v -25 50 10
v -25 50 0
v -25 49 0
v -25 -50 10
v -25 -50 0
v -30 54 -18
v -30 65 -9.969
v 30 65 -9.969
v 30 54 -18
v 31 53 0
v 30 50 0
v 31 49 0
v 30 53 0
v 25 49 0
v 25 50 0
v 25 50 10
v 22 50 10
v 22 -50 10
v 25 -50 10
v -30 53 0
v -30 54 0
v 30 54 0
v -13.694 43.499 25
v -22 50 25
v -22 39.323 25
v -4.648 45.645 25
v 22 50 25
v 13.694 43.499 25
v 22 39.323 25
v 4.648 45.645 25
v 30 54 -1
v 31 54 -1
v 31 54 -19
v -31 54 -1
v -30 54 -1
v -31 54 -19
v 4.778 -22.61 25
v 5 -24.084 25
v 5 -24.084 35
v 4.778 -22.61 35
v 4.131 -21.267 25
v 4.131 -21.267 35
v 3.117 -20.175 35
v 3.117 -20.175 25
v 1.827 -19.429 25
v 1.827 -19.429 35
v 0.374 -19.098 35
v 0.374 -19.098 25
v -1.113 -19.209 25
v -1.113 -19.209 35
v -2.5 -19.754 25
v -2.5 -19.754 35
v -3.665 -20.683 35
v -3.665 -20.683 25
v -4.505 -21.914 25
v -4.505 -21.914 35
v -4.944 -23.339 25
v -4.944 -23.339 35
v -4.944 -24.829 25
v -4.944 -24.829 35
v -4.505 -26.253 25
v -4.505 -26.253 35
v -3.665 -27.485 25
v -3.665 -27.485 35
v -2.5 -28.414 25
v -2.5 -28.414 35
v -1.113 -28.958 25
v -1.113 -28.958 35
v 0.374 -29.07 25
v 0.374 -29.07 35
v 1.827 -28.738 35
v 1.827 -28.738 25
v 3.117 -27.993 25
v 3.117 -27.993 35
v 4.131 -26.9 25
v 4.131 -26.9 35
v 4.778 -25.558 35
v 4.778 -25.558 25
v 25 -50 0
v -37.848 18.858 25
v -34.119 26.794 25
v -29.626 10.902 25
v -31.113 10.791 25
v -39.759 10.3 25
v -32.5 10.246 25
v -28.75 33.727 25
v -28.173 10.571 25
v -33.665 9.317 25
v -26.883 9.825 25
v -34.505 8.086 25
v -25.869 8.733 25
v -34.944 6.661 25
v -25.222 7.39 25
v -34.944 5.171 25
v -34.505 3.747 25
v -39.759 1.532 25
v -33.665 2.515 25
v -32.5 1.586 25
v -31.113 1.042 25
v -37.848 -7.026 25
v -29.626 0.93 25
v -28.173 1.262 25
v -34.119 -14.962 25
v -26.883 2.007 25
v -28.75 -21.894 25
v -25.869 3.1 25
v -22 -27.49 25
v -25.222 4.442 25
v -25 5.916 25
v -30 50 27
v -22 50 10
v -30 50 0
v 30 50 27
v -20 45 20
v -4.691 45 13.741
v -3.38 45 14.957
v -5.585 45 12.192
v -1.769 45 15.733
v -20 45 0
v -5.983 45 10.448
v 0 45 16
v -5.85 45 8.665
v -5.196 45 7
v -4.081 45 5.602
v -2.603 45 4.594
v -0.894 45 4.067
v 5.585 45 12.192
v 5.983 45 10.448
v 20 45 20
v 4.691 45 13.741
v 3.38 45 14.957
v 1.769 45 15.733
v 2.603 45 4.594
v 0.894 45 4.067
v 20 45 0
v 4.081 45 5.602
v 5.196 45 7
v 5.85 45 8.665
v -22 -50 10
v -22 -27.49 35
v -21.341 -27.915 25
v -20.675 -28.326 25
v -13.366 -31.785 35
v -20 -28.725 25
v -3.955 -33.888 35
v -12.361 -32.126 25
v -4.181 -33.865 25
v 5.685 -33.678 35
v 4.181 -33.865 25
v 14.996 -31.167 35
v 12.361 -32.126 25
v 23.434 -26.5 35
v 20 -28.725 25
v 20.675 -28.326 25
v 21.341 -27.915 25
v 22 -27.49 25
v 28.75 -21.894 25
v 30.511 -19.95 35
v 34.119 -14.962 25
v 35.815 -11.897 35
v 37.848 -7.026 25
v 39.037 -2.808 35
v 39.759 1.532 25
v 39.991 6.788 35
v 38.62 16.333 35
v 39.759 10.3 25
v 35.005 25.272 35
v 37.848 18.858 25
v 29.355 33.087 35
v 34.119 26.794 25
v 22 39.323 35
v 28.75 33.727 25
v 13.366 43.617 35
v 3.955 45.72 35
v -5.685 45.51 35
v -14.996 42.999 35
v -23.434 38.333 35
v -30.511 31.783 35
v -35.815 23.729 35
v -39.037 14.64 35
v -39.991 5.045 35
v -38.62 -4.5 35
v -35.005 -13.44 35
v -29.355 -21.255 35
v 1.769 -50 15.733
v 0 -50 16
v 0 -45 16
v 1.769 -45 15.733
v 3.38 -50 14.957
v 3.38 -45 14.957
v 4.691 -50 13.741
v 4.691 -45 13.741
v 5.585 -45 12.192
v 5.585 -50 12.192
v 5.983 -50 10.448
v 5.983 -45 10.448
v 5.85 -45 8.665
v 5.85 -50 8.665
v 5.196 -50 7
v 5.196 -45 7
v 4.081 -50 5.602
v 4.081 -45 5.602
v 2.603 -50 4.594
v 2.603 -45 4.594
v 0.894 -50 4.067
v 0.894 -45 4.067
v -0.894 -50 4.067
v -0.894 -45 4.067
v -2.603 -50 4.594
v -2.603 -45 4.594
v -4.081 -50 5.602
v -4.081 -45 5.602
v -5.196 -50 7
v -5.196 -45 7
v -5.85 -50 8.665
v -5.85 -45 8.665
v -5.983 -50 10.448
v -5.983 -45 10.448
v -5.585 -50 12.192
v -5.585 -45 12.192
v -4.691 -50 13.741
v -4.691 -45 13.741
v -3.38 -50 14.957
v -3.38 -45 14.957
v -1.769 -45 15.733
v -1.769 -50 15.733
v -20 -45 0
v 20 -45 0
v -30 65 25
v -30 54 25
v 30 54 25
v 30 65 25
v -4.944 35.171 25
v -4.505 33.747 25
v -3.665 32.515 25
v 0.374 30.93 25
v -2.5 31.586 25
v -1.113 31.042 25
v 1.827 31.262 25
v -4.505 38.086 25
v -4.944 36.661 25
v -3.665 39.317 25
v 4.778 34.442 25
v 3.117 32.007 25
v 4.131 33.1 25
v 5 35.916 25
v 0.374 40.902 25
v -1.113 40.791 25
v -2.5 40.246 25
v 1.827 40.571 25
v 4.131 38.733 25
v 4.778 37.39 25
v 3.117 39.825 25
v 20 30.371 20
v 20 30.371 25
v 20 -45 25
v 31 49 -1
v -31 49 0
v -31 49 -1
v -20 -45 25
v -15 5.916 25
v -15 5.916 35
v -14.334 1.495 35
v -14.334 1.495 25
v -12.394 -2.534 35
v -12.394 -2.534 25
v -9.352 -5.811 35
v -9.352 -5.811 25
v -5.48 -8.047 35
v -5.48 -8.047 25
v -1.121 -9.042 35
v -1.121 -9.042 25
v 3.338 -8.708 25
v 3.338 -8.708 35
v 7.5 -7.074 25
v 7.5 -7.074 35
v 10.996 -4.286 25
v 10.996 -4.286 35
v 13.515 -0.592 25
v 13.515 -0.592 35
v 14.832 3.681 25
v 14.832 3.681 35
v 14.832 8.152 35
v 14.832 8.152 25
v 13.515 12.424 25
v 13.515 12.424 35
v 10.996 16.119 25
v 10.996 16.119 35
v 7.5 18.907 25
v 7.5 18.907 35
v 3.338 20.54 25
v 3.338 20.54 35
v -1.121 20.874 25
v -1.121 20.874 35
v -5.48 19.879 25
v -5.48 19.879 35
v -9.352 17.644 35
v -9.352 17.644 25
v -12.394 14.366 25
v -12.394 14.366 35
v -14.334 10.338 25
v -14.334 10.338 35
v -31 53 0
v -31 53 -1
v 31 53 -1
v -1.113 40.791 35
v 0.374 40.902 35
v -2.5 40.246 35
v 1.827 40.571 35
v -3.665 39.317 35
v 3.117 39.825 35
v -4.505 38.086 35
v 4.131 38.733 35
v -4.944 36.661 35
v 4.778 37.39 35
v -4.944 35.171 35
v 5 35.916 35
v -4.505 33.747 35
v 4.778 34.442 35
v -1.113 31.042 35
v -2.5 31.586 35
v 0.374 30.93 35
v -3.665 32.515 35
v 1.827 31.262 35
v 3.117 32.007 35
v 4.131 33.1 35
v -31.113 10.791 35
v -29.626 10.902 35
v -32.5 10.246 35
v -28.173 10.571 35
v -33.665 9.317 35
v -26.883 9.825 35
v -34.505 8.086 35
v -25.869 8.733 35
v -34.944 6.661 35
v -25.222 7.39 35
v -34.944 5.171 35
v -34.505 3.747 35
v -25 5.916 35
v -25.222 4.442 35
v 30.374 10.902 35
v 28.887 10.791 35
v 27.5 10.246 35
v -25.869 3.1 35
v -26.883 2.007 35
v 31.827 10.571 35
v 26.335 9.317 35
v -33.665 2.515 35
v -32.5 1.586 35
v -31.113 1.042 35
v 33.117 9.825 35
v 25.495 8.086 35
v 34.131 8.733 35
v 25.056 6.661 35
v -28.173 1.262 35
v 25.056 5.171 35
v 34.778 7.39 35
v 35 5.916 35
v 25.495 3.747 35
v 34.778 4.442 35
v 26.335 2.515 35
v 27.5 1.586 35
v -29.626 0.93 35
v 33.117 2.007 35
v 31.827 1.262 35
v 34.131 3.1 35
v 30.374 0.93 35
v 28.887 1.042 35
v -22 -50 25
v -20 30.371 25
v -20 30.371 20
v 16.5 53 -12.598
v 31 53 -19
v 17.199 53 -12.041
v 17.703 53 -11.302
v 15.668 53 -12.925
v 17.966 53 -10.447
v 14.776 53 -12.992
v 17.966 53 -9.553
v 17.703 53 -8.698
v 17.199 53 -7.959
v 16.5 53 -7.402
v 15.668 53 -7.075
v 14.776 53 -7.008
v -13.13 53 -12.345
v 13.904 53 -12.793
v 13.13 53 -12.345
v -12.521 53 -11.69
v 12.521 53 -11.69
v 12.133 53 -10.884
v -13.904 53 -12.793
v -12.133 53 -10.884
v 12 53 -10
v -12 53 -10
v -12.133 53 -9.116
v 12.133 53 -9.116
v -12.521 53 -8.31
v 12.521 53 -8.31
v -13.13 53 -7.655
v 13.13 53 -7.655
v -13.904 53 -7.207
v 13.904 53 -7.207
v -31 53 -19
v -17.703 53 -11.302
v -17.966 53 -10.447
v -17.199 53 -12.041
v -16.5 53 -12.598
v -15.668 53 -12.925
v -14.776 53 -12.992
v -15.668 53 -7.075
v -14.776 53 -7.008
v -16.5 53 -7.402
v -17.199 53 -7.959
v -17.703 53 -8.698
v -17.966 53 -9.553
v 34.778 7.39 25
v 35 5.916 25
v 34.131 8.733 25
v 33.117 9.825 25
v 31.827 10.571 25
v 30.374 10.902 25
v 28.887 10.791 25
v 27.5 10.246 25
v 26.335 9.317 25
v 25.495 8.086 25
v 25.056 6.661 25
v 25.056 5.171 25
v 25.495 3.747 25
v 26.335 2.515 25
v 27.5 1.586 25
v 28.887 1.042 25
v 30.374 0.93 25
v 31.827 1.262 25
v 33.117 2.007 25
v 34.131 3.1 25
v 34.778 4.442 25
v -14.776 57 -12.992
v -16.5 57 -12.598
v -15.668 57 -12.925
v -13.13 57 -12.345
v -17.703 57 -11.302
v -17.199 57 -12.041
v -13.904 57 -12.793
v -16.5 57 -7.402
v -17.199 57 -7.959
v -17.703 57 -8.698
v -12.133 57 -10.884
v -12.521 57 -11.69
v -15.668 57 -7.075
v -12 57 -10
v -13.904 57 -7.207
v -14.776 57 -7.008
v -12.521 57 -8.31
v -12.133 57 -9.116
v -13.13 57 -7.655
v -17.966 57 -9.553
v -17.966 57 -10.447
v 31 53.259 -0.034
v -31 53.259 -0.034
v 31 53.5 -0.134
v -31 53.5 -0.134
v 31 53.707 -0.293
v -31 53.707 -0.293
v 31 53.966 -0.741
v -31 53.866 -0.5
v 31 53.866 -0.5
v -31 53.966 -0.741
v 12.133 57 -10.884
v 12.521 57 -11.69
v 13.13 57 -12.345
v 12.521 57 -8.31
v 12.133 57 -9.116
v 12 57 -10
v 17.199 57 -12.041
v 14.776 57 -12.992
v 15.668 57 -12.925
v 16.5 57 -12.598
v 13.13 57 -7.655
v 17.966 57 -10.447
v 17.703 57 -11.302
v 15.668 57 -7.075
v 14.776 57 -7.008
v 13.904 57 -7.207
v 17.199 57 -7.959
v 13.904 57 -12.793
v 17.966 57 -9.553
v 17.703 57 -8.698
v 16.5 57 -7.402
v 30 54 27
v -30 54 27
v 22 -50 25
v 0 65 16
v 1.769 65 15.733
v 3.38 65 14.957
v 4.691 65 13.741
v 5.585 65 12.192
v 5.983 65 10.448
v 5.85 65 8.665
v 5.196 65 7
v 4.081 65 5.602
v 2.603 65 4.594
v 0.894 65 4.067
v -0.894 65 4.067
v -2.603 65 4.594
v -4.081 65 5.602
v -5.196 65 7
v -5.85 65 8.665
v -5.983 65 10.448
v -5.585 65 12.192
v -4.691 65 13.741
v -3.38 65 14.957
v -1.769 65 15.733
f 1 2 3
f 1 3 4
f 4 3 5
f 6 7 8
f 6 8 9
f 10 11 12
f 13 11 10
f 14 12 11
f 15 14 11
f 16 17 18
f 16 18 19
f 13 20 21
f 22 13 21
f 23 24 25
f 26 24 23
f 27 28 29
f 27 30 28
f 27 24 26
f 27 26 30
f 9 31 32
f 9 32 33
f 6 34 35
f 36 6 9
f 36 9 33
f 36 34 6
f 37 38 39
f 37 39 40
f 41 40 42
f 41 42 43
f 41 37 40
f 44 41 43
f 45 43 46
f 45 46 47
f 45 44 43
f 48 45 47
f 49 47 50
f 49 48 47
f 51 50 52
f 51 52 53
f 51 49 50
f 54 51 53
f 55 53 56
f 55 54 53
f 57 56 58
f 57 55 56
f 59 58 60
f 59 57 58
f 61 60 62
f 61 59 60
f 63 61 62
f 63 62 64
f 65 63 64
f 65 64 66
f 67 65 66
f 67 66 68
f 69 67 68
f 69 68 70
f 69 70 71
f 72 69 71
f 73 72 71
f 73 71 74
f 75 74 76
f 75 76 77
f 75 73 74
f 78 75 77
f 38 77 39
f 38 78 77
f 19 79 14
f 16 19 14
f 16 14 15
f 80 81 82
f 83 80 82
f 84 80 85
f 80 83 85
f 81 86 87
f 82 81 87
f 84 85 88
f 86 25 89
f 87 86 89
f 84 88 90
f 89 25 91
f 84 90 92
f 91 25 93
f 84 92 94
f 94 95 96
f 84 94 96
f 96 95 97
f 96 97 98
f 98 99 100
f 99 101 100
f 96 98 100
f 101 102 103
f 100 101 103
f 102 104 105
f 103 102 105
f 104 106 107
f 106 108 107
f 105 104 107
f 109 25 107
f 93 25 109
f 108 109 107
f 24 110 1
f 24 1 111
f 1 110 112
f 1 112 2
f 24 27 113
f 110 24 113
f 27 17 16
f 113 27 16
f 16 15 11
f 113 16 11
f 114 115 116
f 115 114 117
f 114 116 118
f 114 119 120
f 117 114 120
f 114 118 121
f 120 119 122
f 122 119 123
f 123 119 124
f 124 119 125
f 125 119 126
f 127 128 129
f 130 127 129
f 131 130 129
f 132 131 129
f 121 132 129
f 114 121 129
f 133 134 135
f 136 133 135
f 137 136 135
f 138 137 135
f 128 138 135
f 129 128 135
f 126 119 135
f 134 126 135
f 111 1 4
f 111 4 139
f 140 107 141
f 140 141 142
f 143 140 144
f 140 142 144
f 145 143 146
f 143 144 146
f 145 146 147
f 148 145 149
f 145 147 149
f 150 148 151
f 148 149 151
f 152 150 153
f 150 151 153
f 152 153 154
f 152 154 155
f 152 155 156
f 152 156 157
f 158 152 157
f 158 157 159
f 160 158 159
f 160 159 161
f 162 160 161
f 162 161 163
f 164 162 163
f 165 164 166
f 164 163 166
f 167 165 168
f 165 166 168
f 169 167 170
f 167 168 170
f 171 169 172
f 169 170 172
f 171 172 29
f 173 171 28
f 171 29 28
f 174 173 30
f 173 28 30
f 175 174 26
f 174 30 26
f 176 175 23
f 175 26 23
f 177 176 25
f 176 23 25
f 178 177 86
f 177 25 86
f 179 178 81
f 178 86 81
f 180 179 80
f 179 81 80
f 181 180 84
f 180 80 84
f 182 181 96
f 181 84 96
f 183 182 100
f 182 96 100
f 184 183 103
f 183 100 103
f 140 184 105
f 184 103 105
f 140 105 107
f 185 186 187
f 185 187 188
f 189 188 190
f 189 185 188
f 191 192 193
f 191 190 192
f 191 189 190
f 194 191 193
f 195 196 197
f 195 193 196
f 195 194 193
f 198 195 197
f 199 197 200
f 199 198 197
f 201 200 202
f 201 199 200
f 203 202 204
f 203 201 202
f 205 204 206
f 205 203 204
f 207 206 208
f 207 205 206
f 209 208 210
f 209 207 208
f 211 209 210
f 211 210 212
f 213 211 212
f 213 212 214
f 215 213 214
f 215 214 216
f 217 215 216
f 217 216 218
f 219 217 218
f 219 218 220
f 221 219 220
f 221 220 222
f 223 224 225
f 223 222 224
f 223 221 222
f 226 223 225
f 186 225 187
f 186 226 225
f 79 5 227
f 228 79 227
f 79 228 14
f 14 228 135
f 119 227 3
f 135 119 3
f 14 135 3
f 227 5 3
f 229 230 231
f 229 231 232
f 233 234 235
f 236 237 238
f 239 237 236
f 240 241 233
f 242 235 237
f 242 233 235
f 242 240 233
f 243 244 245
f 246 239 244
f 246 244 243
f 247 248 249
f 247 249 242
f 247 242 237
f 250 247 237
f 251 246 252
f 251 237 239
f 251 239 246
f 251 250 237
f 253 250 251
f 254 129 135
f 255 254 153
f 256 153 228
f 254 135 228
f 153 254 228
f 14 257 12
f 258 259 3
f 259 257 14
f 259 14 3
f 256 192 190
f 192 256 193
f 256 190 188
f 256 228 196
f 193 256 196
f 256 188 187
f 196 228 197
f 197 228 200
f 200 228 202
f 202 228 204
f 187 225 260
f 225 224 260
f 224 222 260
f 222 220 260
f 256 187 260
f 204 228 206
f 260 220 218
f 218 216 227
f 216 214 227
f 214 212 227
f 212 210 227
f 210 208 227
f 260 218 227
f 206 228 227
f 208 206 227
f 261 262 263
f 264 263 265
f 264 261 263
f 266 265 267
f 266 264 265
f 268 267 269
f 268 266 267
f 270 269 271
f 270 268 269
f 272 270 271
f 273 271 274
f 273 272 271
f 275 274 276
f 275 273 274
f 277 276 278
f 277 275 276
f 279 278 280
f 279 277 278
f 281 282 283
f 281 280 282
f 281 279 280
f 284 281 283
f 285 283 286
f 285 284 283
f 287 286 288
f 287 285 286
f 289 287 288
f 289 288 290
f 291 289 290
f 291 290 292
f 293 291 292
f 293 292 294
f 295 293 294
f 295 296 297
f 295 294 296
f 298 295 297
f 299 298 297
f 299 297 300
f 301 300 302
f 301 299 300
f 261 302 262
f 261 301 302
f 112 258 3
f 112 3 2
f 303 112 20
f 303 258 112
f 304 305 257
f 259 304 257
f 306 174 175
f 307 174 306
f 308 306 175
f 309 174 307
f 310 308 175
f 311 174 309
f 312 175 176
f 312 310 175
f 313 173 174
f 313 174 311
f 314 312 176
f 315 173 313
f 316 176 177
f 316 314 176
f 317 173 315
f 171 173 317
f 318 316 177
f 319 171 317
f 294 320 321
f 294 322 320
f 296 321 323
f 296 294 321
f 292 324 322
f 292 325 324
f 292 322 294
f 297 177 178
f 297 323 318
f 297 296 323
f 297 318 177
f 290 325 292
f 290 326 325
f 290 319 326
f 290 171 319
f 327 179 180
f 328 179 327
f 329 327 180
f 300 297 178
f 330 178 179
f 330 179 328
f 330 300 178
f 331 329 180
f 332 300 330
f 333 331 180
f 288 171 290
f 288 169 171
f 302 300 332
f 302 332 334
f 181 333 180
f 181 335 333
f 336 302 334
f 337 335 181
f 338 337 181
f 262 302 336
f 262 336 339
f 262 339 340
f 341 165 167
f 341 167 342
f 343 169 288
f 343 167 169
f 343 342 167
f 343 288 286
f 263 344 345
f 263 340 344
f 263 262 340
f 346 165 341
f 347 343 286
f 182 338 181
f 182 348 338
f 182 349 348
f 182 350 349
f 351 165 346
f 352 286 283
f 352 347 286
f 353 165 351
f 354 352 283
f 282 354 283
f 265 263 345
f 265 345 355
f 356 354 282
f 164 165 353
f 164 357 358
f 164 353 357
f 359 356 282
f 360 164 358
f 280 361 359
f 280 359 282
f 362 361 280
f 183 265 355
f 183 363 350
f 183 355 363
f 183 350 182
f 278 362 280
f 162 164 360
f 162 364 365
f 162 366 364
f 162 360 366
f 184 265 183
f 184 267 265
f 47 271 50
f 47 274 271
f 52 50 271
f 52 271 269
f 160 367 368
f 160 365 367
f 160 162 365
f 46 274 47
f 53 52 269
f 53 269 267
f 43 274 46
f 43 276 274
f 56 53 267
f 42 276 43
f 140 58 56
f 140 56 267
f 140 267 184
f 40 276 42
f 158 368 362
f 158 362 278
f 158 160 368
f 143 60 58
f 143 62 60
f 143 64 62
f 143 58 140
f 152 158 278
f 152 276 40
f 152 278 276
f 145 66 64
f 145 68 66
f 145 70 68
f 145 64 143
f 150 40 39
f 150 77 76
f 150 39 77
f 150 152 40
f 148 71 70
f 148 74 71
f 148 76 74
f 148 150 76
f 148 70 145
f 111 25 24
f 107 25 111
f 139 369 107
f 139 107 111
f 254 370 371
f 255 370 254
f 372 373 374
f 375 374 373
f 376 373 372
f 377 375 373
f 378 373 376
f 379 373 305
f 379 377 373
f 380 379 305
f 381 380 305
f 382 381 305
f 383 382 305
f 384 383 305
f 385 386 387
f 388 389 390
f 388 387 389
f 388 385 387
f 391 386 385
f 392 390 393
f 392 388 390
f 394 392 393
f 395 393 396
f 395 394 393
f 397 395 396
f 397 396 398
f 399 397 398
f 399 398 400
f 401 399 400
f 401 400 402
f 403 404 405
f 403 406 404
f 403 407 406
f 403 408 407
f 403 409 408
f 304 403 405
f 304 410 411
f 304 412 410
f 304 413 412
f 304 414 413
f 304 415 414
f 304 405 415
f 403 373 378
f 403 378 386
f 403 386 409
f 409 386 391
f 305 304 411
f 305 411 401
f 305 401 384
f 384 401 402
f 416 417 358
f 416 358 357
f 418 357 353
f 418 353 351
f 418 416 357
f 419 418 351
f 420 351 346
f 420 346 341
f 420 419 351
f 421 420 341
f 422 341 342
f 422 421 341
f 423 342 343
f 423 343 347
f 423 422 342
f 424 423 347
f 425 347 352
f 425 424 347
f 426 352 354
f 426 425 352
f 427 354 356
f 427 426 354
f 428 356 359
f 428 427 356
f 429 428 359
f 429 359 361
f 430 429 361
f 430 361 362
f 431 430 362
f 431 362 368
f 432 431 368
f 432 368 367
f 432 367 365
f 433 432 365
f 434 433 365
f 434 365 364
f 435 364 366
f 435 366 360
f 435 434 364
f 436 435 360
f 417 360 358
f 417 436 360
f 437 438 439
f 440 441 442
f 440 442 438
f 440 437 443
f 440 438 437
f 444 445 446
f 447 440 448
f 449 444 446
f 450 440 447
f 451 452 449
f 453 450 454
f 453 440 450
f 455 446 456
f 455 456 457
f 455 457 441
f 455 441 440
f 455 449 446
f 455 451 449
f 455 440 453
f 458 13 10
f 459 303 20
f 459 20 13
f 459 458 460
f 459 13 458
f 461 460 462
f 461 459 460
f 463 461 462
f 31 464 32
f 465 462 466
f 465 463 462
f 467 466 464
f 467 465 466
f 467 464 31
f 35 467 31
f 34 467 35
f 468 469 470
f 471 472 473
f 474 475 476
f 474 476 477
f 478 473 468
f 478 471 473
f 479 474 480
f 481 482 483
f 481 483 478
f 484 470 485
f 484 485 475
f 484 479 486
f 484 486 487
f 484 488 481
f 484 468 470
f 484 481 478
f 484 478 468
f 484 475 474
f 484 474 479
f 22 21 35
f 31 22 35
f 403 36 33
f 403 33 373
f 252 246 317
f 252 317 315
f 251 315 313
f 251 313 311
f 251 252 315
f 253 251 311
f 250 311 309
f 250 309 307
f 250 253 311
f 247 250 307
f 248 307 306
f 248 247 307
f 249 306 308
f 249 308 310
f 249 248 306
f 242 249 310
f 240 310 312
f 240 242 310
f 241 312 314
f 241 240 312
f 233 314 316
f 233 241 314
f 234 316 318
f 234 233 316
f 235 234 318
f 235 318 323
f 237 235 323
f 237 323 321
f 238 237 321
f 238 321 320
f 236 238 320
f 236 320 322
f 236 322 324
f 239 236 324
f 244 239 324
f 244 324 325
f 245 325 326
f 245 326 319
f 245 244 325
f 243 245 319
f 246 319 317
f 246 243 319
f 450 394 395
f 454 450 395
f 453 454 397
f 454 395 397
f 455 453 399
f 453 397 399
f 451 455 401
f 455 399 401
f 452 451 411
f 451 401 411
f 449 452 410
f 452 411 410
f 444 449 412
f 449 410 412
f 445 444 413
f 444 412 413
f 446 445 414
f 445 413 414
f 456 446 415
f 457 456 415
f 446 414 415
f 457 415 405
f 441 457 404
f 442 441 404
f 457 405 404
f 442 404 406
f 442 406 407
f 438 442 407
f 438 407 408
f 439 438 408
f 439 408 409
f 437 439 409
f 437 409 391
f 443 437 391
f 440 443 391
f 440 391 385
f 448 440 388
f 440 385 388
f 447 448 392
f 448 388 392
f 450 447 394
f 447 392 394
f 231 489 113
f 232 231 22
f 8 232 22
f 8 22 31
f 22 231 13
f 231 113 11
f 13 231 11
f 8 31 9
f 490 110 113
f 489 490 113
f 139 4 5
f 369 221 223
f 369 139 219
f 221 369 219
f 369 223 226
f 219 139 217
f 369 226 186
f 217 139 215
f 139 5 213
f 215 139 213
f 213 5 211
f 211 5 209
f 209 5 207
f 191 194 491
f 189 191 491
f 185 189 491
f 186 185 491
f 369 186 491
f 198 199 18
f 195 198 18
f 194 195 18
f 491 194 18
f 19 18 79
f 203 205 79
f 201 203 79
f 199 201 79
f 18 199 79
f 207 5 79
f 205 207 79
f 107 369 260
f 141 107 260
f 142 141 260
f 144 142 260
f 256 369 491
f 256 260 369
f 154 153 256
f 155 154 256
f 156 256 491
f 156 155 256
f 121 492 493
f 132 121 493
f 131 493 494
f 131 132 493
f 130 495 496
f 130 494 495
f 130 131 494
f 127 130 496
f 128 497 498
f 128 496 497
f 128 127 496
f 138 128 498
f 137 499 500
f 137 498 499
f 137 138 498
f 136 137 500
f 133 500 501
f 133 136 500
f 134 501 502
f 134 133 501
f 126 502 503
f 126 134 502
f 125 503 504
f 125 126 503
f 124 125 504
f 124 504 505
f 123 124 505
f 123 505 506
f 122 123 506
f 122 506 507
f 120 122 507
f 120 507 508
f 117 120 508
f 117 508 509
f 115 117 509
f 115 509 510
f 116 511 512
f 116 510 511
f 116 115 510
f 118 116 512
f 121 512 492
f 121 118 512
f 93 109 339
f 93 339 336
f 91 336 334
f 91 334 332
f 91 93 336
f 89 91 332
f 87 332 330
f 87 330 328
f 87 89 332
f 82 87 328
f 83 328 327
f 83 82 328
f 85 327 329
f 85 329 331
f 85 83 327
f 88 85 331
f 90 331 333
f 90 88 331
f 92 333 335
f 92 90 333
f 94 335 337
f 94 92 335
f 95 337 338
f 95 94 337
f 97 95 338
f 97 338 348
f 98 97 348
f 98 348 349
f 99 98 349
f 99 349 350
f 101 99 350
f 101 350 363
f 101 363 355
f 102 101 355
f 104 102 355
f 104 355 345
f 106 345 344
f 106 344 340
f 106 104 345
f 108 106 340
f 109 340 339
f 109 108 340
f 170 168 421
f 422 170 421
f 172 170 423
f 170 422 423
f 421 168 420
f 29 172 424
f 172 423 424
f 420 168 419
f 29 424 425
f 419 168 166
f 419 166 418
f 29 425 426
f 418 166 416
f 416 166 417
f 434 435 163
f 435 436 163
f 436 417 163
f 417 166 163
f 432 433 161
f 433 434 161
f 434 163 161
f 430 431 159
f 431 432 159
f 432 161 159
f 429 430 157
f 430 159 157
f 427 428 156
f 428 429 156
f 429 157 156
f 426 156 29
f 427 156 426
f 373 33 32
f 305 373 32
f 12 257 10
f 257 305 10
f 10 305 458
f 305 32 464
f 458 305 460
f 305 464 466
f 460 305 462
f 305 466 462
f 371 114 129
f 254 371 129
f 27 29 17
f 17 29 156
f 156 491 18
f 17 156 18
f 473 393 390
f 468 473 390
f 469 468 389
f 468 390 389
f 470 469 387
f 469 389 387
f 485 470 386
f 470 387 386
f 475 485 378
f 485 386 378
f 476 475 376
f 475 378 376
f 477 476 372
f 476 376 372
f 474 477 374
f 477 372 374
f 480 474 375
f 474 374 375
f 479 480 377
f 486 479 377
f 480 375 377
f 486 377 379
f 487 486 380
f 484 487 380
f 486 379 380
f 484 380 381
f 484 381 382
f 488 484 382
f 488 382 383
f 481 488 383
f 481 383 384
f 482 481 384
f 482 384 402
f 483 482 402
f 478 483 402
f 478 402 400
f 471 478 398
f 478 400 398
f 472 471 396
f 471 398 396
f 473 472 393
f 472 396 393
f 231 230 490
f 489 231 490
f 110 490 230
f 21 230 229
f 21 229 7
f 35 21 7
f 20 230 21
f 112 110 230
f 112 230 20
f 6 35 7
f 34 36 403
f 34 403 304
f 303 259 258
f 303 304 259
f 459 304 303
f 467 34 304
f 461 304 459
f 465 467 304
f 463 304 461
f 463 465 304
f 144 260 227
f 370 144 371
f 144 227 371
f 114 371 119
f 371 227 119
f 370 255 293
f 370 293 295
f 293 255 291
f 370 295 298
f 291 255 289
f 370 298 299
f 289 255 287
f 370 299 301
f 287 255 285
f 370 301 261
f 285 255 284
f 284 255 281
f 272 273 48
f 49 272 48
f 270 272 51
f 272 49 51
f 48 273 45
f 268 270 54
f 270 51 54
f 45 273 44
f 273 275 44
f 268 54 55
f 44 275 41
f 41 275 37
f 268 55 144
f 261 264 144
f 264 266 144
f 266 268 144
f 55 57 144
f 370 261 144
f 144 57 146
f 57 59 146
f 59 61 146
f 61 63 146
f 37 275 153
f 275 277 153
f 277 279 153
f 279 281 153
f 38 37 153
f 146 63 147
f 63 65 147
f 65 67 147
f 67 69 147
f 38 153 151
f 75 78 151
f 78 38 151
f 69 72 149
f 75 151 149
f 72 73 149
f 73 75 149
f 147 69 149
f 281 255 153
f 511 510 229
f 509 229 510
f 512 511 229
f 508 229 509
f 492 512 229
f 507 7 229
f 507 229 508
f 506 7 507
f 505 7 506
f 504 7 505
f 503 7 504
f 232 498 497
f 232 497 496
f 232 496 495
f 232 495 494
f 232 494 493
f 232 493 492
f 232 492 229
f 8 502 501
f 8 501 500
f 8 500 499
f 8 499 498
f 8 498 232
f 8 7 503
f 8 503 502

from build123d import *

# Parameters (mm, degrees)
SKETCH_1_W               = 50
SKETCH_1_H               = 100
SKETCH_1_W_2             = 40
SKETCH_1_H_2             = 90
EXTRUDE_1_DEPTH          = 25
CUT_EXTRUDE_1_DEPTH      = 100
CUT_EXTRUDE_1_DEPTH_BACK = 100
SKETCH_2_W               = 3
SKETCH_2_H               = 15
EXTRUDE_2_DEPTH          = 15
SKETCH_7_W               = 2
SKETCH_7_H               = 11
CUT_EXTRUDE_2_DEPTH      = 103
CUT_EXTRUDE_3_DEPTH      = 103
CUT_EXTRUDE_4_DEPTH      = 103
EXTRUDE_4_DEPTH          = 62
CUT_EXTRUDE_5_DEPTH      = 30
CUT_EXTRUDE_5_DEPTH_BACK = 123
SKETCH_15_R              = 6
SKETCH_16_R              = 3
CUT_EXTRUDE_6_DEPTH      = 4
SKETCH_18_W              = 40
SKETCH_18_H              = 14.629062191
EXTRUDE_5_DEPTH          = 5
SKETCH_19_R              = 40
SKETCH_19_R_2            = 5
EXTRUDE_7_DEPTH          = 10
SKETCH_19_8_R            = 15
CUT_EXTRUDE_8_DEPTH      = 25


with BuildPart() as part:
    # 草图1 → 凸台-拉伸1 (new body)
    with BuildSketch(Plane.XY):
        Rectangle(SKETCH_1_W, SKETCH_1_H)
        Rectangle(SKETCH_1_W_2, SKETCH_1_H_2, mode=Mode.SUBTRACT)
    extrude(amount=EXTRUDE_1_DEPTH)

    # 草图2 → 切除-拉伸1 (cut, two sides: drawn at the far end of the back side and taken through both)
    with BuildSketch(Plane(origin=(0, 0, 0), x_dir=(1, 0, 0), z_dir=(0, 1, 0)).offset(-CUT_EXTRUDE_1_DEPTH_BACK)):
        with Locations((23.5, -17.5)):
            Rectangle(SKETCH_2_W, SKETCH_2_H)
        with Locations((-23.5, -17.5)):
            Rectangle(SKETCH_2_W, SKETCH_2_H)
    extrude(amount=CUT_EXTRUDE_1_DEPTH + CUT_EXTRUDE_1_DEPTH_BACK, mode=Mode.SUBTRACT)

    # 草图5 → 凸台-拉伸2 (add)
    with BuildSketch(Plane(origin=(0, 50, 0), x_dir=(1, 0, 0), z_dir=(0, 1, 0))):
        Polygon((30, 18), (-20.718865569, 18), (-30, 18), (-30, -27), (30, -27), align=None)
    extrude(amount=EXTRUDE_2_DEPTH)

    # 草图7 → 切除-拉伸2 (cut)
    with BuildSketch(Plane.ZY.offset(30)):
        with Locations((26, 59.5)):
            Rectangle(SKETCH_7_W, SKETCH_7_H)
    extrude(amount=-CUT_EXTRUDE_2_DEPTH, mode=Mode.SUBTRACT)

    # 草图12 → 切除-拉伸3 (cut)
    with BuildSketch(Plane.ZY.offset(30)):
        Polygon((-9.968923852, 65), (-18, 65), (-18, 54), align=None)
    extrude(amount=-CUT_EXTRUDE_3_DEPTH, mode=Mode.SUBTRACT)

    # 草图13 → 切除-拉伸4 (cut)
    with BuildSketch(Plane.ZY.offset(30)):
        Polygon((0, 50), (0, 54), (-18, 54), (-18, 49.192005068), (0, 49.192005068), align=None)
    extrude(amount=-CUT_EXTRUDE_4_DEPTH, mode=Mode.SUBTRACT)

    # 草图14 → 凸台-拉伸4 (add)
    with BuildSketch(Plane.ZY.offset(31)):
        with BuildLine():
            Line((-1, 49), (0, 49))
            Line((0, 49), (0, 53))
            ThreePointArc((0, 53), (-0.292893219, 53.707106781), (-1, 54))
            Line((-1, 54), (-19, 54))
            Line((-19, 54), (-19, 53))
            Line((-19, 53), (-1, 53))
            Line((-1, 53), (-1, 49))
        make_face()
    extrude(amount=-EXTRUDE_4_DEPTH)

    # 草图15 → 切除-拉伸5 (cut, two sides: drawn at the far end of the back side and taken through both)
    with BuildSketch(Plane(origin=(0, 50, 0), x_dir=(1, 0, 0), z_dir=(0, 1, 0)).offset(-CUT_EXTRUDE_5_DEPTH_BACK)):
        with Locations((0, -10)):
            Circle(SKETCH_15_R)
    extrude(amount=CUT_EXTRUDE_5_DEPTH + CUT_EXTRUDE_5_DEPTH_BACK, mode=Mode.SUBTRACT)

    # 草图16 → 切除-拉伸6 (cut)
    with BuildSketch(Plane.XZ.offset(-53)):
        with Locations((15, -10)):
            Circle(SKETCH_16_R)
        with Locations((-15, -10)):
            Circle(SKETCH_16_R)
    extrude(amount=-CUT_EXTRUDE_6_DEPTH, mode=Mode.SUBTRACT)

    # 草图18 → 凸台-拉伸5 (add)
    with BuildSketch(Plane.XY.offset(25)):
        with Locations((0, 37.685468904)):
            Rectangle(SKETCH_18_W, SKETCH_18_H)
    extrude(amount=-EXTRUDE_5_DEPTH)

    # 草图19 → 凸台-拉伸7 (add)
    with BuildSketch(Plane.XY.offset(25)):
        with Locations((0, 5.916189744)):
            Circle(SKETCH_19_R)
        with BuildLine():
            ThreePointArc((0, 40.916189744), (5, 35.916189744), (0, 30.916189744))
            ThreePointArc((0, 30.916189744), (-5, 35.916189744), (0, 40.916189744))
        make_face(mode=Mode.SUBTRACT)
        with Locations((-30, 5.916189744)):
            Circle(SKETCH_19_R_2, mode=Mode.SUBTRACT)
        with Locations((0, -24.083810256)):
            Circle(SKETCH_19_R_2, mode=Mode.SUBTRACT)
        with Locations((30, 5.916189744)):
            Circle(SKETCH_19_R_2, mode=Mode.SUBTRACT)
    extrude(amount=EXTRUDE_7_DEPTH)

    # 草图19<8> → 切除-拉伸8 (cut)
    with BuildSketch(Plane.XY.offset(25)):
        with Locations((0, 5.916189744)):
            Circle(SKETCH_19_8_R)
    extrude(amount=CUT_EXTRUDE_8_DEPTH, mode=Mode.SUBTRACT)


solid = part.part
